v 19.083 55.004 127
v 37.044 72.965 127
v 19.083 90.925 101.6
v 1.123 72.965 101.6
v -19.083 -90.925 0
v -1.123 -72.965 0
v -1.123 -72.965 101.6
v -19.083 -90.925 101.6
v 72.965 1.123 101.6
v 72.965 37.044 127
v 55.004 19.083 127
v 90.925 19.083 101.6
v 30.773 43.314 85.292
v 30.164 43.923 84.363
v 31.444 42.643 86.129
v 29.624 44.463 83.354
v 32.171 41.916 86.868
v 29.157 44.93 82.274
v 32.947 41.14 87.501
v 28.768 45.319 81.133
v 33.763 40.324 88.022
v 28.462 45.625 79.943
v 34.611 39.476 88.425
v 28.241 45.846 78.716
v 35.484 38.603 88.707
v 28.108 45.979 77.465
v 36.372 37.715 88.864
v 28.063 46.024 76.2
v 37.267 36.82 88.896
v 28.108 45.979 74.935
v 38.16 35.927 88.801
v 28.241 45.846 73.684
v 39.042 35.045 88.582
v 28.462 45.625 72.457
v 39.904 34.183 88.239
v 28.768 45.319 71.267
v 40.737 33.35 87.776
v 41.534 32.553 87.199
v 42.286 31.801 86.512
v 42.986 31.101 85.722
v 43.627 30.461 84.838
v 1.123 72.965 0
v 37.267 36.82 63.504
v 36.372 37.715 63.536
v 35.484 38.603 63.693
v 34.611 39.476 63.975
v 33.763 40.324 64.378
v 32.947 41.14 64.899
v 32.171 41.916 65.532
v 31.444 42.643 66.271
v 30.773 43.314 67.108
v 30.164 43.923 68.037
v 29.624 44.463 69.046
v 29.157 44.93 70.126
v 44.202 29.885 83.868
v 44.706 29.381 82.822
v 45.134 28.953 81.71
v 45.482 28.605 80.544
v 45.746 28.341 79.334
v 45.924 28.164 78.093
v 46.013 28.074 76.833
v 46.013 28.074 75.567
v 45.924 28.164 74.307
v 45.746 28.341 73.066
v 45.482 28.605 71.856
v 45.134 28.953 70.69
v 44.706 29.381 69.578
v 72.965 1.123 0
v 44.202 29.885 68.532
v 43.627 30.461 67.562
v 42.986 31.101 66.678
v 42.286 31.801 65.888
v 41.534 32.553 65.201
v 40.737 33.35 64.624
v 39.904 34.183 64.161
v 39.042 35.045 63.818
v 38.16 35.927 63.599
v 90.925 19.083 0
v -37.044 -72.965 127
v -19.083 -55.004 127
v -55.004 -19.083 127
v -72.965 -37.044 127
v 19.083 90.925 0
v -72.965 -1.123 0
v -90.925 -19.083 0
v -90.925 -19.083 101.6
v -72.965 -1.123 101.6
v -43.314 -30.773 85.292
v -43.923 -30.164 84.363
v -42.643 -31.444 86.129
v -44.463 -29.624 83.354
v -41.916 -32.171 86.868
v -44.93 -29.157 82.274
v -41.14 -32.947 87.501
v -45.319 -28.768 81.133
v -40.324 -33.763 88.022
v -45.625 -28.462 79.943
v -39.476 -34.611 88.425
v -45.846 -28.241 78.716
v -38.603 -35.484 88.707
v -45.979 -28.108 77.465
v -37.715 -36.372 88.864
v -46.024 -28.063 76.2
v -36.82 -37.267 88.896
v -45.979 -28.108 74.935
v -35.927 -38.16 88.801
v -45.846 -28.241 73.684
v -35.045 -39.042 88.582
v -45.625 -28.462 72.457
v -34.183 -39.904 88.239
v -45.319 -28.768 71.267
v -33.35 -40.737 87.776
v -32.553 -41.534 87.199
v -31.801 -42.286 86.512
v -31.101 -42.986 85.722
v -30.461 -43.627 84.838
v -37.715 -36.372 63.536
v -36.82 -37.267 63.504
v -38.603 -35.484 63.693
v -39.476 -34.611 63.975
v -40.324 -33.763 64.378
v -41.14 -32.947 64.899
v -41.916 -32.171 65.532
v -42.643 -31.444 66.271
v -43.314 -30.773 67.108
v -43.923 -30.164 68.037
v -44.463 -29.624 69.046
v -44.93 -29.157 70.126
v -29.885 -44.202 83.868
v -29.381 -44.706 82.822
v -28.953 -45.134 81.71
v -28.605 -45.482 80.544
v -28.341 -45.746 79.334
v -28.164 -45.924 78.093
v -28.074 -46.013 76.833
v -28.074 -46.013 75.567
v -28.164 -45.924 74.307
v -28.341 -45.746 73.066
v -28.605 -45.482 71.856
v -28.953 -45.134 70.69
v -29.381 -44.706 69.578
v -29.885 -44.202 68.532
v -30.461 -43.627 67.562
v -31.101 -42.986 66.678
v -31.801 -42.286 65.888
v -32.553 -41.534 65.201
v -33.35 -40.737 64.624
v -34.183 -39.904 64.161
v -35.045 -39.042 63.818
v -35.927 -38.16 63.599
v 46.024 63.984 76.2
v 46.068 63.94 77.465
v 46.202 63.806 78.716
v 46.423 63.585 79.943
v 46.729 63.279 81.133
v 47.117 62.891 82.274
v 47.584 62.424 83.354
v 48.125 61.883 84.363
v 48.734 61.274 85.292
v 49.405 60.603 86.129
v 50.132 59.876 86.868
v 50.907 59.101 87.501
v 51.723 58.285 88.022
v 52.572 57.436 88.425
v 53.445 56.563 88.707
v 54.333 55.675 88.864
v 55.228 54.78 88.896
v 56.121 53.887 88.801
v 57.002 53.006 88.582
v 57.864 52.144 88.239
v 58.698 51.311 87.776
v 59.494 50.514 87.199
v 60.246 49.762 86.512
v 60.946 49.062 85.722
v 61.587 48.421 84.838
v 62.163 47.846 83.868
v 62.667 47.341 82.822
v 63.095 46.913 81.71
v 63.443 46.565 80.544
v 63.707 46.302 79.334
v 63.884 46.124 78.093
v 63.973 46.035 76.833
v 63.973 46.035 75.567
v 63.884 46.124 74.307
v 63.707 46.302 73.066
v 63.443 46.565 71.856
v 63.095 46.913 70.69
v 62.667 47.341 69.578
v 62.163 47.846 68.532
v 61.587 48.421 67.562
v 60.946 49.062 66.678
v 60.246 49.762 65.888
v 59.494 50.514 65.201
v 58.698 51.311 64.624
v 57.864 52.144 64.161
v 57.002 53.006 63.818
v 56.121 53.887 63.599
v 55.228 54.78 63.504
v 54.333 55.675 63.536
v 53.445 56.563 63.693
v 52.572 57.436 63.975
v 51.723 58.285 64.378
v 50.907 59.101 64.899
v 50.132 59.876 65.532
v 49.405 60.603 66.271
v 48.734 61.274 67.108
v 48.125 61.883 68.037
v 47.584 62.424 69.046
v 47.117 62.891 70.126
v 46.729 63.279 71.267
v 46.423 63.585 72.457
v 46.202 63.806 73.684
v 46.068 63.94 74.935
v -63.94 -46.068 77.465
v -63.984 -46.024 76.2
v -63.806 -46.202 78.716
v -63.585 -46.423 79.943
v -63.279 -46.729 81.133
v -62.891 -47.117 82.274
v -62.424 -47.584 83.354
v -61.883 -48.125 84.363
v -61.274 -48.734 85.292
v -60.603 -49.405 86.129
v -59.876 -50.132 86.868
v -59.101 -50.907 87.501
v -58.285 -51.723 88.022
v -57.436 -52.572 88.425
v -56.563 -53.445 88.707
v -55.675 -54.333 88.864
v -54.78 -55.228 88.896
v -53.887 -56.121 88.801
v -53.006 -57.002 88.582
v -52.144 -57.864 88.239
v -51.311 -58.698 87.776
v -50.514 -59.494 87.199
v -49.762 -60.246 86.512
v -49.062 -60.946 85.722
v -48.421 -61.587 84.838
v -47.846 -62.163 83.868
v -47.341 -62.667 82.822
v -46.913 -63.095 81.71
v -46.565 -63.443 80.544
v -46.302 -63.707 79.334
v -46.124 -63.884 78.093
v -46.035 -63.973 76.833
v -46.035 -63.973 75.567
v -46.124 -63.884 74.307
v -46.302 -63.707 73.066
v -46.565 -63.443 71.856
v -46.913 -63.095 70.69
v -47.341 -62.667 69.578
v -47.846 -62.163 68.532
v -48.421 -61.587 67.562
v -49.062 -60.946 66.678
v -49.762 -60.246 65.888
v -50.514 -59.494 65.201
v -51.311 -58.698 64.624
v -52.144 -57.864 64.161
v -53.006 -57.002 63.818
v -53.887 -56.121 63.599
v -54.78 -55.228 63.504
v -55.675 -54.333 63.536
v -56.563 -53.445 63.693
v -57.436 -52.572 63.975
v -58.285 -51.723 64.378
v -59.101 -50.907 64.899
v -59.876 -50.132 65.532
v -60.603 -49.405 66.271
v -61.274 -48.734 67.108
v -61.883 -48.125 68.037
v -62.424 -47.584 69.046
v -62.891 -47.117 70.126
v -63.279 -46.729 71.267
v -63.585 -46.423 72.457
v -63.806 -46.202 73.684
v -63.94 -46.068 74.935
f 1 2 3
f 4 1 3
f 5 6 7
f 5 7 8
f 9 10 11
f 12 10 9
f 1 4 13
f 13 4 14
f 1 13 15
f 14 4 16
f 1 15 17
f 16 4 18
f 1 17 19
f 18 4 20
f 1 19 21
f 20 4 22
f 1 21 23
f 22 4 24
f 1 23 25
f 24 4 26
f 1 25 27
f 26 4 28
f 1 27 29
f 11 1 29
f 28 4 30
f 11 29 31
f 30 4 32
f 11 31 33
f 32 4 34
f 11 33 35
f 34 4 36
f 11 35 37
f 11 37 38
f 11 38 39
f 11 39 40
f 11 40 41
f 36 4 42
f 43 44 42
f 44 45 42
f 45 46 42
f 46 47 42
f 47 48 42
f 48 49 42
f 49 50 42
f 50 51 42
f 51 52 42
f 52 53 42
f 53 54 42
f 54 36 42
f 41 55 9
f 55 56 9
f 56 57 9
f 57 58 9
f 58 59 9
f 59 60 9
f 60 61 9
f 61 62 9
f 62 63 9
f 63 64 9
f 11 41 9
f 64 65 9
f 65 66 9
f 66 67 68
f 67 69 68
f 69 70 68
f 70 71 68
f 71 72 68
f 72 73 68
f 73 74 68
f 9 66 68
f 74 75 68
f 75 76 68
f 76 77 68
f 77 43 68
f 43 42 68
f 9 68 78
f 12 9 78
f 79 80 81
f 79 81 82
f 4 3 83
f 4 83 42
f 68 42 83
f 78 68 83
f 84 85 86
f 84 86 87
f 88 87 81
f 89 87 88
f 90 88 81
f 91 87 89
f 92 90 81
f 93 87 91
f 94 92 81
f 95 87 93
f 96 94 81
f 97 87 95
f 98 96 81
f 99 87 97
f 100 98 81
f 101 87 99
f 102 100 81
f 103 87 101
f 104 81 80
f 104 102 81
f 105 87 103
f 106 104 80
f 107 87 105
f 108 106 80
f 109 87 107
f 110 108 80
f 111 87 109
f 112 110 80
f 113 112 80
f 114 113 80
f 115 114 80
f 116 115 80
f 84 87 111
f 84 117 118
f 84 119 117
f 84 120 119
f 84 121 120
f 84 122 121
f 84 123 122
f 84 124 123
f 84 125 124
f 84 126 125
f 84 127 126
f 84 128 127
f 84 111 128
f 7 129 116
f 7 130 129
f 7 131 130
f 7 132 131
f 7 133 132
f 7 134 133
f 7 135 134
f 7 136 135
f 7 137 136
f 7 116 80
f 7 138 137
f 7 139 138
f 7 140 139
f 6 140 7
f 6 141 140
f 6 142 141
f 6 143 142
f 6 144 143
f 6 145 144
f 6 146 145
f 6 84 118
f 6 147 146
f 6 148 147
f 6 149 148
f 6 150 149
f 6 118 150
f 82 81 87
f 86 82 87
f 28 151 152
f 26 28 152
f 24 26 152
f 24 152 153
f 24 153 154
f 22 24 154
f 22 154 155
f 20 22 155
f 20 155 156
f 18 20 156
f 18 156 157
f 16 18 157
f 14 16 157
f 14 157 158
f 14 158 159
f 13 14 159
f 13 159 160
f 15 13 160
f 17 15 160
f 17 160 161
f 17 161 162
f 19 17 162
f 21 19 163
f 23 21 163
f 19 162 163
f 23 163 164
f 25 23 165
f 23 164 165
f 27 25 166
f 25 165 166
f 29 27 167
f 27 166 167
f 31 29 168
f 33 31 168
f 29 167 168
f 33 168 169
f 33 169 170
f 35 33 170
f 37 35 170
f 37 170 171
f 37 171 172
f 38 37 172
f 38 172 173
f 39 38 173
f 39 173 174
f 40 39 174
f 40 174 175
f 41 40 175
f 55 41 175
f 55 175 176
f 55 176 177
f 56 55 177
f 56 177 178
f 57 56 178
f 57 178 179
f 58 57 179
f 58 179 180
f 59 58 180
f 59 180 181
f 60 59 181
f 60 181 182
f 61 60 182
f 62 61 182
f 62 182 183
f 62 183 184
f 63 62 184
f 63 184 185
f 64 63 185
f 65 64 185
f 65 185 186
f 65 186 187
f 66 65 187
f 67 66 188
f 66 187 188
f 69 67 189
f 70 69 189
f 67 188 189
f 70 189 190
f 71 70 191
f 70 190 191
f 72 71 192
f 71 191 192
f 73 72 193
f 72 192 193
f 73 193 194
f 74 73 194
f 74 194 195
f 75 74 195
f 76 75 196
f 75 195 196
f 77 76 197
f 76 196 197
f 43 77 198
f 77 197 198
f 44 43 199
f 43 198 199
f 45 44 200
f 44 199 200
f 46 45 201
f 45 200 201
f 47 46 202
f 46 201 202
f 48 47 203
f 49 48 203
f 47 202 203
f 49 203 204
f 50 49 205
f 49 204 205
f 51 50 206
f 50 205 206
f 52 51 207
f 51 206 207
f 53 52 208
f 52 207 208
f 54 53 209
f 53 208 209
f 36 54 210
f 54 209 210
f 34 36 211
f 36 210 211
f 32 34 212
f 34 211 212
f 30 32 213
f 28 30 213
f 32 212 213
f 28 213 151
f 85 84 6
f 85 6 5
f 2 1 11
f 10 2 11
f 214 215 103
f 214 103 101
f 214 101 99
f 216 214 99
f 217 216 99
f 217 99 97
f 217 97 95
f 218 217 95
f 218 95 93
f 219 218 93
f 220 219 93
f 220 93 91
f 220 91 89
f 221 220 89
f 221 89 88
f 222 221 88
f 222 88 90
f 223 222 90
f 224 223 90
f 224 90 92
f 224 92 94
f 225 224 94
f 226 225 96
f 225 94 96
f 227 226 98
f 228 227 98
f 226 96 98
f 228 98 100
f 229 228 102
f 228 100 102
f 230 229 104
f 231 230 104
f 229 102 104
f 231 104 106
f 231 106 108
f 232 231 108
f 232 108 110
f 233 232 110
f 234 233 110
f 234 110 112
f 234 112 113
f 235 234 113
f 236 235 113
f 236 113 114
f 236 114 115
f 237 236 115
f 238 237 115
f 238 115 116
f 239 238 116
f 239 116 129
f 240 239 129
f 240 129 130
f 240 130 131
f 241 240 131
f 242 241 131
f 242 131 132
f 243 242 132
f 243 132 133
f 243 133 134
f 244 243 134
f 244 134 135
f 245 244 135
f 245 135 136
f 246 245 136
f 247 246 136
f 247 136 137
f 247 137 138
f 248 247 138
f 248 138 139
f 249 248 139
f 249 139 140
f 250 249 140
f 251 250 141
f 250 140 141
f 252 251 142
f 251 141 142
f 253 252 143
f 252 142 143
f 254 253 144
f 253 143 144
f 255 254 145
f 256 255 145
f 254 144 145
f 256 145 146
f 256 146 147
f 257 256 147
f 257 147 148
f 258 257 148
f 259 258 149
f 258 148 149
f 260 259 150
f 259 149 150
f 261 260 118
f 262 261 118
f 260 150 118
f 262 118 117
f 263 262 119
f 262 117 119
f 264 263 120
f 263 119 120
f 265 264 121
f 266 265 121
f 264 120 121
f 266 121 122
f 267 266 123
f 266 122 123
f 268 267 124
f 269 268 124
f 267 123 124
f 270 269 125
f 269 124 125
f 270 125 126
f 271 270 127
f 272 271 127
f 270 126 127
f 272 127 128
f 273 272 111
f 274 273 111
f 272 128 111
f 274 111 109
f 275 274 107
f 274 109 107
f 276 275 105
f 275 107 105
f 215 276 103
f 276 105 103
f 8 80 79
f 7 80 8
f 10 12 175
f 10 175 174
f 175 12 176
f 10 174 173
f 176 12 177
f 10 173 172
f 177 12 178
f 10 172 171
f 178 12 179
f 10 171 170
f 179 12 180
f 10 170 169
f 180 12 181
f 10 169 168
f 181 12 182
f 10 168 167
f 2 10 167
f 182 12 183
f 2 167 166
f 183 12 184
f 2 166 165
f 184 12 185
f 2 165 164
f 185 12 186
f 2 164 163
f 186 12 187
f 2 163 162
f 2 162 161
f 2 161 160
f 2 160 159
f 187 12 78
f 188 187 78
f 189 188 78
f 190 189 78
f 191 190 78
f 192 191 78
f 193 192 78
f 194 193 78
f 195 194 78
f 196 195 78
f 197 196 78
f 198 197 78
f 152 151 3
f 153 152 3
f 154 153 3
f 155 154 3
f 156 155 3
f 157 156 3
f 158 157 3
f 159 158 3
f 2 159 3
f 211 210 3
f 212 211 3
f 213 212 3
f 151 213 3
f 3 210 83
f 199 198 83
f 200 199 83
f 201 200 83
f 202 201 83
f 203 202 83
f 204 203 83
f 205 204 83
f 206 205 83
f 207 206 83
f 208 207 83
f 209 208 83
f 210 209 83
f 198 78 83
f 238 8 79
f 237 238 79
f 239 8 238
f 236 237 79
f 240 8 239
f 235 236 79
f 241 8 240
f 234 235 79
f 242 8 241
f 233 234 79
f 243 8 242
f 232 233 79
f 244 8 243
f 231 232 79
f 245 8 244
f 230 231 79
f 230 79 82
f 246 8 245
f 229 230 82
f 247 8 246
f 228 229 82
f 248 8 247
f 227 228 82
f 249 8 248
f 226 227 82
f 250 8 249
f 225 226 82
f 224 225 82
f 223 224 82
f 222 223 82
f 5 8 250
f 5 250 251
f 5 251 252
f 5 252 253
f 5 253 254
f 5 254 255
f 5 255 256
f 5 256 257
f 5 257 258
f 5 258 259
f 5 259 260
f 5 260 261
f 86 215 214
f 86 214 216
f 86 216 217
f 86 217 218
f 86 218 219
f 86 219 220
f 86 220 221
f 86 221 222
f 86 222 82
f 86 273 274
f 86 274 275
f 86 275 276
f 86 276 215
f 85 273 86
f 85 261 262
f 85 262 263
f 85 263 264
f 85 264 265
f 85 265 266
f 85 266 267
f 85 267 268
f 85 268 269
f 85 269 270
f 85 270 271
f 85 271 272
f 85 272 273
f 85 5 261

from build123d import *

# Parameters (mm, degrees)
EXTRUDE1_DEPTH     = 127
EXTRUDE1_2_DEPTH   = 127
SKETCH3_R          = 12.7
CUT_EXTRUDE1_DEPTH = 243.321358169


with BuildPart() as part:
    # Sketch1 → Extrude1 (new body)
    with BuildSketch(Plane.XY):
        Polygon((-72.964580984, -1.122532015), (-1.122532015, -72.964580984), (-19.083044257, -90.925093226), (-90.925093226, -19.083044257), align=None)
    extrude(amount=EXTRUDE1_DEPTH)


with BuildPart() as body_2:
    # Sketch1 → Extrude1 2 (new body)
    with BuildSketch(Plane.XY):
        Polygon((1.122532015, 72.964580984), (72.964580984, 1.122532015), (90.925093226, 19.083044257), (19.083044257, 90.925093226), align=None)
    extrude(amount=EXTRUDE1_2_DEPTH)


with BuildPart() as cut_extrude1_tool:
    # Sketch3 → Cut-Extrude1 (new, through all)
    with BuildSketch(Plane(origin=(55.004068742, 55.004068742, 0), x_dir=(0, 0, -1), z_dir=(0.7071067811865511, 0.7071067811865439, 0))):
        with Locations(Location((-76.2, 0, 0), (0, 0, 90))):
            Circle(SKETCH3_R)
        Polygon((-127, -25.4), (-101.6, -50.8), (-127, -50.8), align=None)
        Polygon((-127, 25.4), (-101.6, 50.8), (-127, 50.8), align=None)
    extrude(amount=-CUT_EXTRUDE1_DEPTH)


with BuildPart() as part_1:
    add(part.part)

    # Cut-Extrude1: cut by cut_extrude1_tool
    add(cut_extrude1_tool.part, mode=Mode.SUBTRACT)


with BuildPart() as body_2_1:
    add(body_2.part)

    # Cut-Extrude1: cut by cut_extrude1_tool
    add(cut_extrude1_tool.part, mode=Mode.SUBTRACT)


solid = Compound([part_1.part, body_2_1.part])
